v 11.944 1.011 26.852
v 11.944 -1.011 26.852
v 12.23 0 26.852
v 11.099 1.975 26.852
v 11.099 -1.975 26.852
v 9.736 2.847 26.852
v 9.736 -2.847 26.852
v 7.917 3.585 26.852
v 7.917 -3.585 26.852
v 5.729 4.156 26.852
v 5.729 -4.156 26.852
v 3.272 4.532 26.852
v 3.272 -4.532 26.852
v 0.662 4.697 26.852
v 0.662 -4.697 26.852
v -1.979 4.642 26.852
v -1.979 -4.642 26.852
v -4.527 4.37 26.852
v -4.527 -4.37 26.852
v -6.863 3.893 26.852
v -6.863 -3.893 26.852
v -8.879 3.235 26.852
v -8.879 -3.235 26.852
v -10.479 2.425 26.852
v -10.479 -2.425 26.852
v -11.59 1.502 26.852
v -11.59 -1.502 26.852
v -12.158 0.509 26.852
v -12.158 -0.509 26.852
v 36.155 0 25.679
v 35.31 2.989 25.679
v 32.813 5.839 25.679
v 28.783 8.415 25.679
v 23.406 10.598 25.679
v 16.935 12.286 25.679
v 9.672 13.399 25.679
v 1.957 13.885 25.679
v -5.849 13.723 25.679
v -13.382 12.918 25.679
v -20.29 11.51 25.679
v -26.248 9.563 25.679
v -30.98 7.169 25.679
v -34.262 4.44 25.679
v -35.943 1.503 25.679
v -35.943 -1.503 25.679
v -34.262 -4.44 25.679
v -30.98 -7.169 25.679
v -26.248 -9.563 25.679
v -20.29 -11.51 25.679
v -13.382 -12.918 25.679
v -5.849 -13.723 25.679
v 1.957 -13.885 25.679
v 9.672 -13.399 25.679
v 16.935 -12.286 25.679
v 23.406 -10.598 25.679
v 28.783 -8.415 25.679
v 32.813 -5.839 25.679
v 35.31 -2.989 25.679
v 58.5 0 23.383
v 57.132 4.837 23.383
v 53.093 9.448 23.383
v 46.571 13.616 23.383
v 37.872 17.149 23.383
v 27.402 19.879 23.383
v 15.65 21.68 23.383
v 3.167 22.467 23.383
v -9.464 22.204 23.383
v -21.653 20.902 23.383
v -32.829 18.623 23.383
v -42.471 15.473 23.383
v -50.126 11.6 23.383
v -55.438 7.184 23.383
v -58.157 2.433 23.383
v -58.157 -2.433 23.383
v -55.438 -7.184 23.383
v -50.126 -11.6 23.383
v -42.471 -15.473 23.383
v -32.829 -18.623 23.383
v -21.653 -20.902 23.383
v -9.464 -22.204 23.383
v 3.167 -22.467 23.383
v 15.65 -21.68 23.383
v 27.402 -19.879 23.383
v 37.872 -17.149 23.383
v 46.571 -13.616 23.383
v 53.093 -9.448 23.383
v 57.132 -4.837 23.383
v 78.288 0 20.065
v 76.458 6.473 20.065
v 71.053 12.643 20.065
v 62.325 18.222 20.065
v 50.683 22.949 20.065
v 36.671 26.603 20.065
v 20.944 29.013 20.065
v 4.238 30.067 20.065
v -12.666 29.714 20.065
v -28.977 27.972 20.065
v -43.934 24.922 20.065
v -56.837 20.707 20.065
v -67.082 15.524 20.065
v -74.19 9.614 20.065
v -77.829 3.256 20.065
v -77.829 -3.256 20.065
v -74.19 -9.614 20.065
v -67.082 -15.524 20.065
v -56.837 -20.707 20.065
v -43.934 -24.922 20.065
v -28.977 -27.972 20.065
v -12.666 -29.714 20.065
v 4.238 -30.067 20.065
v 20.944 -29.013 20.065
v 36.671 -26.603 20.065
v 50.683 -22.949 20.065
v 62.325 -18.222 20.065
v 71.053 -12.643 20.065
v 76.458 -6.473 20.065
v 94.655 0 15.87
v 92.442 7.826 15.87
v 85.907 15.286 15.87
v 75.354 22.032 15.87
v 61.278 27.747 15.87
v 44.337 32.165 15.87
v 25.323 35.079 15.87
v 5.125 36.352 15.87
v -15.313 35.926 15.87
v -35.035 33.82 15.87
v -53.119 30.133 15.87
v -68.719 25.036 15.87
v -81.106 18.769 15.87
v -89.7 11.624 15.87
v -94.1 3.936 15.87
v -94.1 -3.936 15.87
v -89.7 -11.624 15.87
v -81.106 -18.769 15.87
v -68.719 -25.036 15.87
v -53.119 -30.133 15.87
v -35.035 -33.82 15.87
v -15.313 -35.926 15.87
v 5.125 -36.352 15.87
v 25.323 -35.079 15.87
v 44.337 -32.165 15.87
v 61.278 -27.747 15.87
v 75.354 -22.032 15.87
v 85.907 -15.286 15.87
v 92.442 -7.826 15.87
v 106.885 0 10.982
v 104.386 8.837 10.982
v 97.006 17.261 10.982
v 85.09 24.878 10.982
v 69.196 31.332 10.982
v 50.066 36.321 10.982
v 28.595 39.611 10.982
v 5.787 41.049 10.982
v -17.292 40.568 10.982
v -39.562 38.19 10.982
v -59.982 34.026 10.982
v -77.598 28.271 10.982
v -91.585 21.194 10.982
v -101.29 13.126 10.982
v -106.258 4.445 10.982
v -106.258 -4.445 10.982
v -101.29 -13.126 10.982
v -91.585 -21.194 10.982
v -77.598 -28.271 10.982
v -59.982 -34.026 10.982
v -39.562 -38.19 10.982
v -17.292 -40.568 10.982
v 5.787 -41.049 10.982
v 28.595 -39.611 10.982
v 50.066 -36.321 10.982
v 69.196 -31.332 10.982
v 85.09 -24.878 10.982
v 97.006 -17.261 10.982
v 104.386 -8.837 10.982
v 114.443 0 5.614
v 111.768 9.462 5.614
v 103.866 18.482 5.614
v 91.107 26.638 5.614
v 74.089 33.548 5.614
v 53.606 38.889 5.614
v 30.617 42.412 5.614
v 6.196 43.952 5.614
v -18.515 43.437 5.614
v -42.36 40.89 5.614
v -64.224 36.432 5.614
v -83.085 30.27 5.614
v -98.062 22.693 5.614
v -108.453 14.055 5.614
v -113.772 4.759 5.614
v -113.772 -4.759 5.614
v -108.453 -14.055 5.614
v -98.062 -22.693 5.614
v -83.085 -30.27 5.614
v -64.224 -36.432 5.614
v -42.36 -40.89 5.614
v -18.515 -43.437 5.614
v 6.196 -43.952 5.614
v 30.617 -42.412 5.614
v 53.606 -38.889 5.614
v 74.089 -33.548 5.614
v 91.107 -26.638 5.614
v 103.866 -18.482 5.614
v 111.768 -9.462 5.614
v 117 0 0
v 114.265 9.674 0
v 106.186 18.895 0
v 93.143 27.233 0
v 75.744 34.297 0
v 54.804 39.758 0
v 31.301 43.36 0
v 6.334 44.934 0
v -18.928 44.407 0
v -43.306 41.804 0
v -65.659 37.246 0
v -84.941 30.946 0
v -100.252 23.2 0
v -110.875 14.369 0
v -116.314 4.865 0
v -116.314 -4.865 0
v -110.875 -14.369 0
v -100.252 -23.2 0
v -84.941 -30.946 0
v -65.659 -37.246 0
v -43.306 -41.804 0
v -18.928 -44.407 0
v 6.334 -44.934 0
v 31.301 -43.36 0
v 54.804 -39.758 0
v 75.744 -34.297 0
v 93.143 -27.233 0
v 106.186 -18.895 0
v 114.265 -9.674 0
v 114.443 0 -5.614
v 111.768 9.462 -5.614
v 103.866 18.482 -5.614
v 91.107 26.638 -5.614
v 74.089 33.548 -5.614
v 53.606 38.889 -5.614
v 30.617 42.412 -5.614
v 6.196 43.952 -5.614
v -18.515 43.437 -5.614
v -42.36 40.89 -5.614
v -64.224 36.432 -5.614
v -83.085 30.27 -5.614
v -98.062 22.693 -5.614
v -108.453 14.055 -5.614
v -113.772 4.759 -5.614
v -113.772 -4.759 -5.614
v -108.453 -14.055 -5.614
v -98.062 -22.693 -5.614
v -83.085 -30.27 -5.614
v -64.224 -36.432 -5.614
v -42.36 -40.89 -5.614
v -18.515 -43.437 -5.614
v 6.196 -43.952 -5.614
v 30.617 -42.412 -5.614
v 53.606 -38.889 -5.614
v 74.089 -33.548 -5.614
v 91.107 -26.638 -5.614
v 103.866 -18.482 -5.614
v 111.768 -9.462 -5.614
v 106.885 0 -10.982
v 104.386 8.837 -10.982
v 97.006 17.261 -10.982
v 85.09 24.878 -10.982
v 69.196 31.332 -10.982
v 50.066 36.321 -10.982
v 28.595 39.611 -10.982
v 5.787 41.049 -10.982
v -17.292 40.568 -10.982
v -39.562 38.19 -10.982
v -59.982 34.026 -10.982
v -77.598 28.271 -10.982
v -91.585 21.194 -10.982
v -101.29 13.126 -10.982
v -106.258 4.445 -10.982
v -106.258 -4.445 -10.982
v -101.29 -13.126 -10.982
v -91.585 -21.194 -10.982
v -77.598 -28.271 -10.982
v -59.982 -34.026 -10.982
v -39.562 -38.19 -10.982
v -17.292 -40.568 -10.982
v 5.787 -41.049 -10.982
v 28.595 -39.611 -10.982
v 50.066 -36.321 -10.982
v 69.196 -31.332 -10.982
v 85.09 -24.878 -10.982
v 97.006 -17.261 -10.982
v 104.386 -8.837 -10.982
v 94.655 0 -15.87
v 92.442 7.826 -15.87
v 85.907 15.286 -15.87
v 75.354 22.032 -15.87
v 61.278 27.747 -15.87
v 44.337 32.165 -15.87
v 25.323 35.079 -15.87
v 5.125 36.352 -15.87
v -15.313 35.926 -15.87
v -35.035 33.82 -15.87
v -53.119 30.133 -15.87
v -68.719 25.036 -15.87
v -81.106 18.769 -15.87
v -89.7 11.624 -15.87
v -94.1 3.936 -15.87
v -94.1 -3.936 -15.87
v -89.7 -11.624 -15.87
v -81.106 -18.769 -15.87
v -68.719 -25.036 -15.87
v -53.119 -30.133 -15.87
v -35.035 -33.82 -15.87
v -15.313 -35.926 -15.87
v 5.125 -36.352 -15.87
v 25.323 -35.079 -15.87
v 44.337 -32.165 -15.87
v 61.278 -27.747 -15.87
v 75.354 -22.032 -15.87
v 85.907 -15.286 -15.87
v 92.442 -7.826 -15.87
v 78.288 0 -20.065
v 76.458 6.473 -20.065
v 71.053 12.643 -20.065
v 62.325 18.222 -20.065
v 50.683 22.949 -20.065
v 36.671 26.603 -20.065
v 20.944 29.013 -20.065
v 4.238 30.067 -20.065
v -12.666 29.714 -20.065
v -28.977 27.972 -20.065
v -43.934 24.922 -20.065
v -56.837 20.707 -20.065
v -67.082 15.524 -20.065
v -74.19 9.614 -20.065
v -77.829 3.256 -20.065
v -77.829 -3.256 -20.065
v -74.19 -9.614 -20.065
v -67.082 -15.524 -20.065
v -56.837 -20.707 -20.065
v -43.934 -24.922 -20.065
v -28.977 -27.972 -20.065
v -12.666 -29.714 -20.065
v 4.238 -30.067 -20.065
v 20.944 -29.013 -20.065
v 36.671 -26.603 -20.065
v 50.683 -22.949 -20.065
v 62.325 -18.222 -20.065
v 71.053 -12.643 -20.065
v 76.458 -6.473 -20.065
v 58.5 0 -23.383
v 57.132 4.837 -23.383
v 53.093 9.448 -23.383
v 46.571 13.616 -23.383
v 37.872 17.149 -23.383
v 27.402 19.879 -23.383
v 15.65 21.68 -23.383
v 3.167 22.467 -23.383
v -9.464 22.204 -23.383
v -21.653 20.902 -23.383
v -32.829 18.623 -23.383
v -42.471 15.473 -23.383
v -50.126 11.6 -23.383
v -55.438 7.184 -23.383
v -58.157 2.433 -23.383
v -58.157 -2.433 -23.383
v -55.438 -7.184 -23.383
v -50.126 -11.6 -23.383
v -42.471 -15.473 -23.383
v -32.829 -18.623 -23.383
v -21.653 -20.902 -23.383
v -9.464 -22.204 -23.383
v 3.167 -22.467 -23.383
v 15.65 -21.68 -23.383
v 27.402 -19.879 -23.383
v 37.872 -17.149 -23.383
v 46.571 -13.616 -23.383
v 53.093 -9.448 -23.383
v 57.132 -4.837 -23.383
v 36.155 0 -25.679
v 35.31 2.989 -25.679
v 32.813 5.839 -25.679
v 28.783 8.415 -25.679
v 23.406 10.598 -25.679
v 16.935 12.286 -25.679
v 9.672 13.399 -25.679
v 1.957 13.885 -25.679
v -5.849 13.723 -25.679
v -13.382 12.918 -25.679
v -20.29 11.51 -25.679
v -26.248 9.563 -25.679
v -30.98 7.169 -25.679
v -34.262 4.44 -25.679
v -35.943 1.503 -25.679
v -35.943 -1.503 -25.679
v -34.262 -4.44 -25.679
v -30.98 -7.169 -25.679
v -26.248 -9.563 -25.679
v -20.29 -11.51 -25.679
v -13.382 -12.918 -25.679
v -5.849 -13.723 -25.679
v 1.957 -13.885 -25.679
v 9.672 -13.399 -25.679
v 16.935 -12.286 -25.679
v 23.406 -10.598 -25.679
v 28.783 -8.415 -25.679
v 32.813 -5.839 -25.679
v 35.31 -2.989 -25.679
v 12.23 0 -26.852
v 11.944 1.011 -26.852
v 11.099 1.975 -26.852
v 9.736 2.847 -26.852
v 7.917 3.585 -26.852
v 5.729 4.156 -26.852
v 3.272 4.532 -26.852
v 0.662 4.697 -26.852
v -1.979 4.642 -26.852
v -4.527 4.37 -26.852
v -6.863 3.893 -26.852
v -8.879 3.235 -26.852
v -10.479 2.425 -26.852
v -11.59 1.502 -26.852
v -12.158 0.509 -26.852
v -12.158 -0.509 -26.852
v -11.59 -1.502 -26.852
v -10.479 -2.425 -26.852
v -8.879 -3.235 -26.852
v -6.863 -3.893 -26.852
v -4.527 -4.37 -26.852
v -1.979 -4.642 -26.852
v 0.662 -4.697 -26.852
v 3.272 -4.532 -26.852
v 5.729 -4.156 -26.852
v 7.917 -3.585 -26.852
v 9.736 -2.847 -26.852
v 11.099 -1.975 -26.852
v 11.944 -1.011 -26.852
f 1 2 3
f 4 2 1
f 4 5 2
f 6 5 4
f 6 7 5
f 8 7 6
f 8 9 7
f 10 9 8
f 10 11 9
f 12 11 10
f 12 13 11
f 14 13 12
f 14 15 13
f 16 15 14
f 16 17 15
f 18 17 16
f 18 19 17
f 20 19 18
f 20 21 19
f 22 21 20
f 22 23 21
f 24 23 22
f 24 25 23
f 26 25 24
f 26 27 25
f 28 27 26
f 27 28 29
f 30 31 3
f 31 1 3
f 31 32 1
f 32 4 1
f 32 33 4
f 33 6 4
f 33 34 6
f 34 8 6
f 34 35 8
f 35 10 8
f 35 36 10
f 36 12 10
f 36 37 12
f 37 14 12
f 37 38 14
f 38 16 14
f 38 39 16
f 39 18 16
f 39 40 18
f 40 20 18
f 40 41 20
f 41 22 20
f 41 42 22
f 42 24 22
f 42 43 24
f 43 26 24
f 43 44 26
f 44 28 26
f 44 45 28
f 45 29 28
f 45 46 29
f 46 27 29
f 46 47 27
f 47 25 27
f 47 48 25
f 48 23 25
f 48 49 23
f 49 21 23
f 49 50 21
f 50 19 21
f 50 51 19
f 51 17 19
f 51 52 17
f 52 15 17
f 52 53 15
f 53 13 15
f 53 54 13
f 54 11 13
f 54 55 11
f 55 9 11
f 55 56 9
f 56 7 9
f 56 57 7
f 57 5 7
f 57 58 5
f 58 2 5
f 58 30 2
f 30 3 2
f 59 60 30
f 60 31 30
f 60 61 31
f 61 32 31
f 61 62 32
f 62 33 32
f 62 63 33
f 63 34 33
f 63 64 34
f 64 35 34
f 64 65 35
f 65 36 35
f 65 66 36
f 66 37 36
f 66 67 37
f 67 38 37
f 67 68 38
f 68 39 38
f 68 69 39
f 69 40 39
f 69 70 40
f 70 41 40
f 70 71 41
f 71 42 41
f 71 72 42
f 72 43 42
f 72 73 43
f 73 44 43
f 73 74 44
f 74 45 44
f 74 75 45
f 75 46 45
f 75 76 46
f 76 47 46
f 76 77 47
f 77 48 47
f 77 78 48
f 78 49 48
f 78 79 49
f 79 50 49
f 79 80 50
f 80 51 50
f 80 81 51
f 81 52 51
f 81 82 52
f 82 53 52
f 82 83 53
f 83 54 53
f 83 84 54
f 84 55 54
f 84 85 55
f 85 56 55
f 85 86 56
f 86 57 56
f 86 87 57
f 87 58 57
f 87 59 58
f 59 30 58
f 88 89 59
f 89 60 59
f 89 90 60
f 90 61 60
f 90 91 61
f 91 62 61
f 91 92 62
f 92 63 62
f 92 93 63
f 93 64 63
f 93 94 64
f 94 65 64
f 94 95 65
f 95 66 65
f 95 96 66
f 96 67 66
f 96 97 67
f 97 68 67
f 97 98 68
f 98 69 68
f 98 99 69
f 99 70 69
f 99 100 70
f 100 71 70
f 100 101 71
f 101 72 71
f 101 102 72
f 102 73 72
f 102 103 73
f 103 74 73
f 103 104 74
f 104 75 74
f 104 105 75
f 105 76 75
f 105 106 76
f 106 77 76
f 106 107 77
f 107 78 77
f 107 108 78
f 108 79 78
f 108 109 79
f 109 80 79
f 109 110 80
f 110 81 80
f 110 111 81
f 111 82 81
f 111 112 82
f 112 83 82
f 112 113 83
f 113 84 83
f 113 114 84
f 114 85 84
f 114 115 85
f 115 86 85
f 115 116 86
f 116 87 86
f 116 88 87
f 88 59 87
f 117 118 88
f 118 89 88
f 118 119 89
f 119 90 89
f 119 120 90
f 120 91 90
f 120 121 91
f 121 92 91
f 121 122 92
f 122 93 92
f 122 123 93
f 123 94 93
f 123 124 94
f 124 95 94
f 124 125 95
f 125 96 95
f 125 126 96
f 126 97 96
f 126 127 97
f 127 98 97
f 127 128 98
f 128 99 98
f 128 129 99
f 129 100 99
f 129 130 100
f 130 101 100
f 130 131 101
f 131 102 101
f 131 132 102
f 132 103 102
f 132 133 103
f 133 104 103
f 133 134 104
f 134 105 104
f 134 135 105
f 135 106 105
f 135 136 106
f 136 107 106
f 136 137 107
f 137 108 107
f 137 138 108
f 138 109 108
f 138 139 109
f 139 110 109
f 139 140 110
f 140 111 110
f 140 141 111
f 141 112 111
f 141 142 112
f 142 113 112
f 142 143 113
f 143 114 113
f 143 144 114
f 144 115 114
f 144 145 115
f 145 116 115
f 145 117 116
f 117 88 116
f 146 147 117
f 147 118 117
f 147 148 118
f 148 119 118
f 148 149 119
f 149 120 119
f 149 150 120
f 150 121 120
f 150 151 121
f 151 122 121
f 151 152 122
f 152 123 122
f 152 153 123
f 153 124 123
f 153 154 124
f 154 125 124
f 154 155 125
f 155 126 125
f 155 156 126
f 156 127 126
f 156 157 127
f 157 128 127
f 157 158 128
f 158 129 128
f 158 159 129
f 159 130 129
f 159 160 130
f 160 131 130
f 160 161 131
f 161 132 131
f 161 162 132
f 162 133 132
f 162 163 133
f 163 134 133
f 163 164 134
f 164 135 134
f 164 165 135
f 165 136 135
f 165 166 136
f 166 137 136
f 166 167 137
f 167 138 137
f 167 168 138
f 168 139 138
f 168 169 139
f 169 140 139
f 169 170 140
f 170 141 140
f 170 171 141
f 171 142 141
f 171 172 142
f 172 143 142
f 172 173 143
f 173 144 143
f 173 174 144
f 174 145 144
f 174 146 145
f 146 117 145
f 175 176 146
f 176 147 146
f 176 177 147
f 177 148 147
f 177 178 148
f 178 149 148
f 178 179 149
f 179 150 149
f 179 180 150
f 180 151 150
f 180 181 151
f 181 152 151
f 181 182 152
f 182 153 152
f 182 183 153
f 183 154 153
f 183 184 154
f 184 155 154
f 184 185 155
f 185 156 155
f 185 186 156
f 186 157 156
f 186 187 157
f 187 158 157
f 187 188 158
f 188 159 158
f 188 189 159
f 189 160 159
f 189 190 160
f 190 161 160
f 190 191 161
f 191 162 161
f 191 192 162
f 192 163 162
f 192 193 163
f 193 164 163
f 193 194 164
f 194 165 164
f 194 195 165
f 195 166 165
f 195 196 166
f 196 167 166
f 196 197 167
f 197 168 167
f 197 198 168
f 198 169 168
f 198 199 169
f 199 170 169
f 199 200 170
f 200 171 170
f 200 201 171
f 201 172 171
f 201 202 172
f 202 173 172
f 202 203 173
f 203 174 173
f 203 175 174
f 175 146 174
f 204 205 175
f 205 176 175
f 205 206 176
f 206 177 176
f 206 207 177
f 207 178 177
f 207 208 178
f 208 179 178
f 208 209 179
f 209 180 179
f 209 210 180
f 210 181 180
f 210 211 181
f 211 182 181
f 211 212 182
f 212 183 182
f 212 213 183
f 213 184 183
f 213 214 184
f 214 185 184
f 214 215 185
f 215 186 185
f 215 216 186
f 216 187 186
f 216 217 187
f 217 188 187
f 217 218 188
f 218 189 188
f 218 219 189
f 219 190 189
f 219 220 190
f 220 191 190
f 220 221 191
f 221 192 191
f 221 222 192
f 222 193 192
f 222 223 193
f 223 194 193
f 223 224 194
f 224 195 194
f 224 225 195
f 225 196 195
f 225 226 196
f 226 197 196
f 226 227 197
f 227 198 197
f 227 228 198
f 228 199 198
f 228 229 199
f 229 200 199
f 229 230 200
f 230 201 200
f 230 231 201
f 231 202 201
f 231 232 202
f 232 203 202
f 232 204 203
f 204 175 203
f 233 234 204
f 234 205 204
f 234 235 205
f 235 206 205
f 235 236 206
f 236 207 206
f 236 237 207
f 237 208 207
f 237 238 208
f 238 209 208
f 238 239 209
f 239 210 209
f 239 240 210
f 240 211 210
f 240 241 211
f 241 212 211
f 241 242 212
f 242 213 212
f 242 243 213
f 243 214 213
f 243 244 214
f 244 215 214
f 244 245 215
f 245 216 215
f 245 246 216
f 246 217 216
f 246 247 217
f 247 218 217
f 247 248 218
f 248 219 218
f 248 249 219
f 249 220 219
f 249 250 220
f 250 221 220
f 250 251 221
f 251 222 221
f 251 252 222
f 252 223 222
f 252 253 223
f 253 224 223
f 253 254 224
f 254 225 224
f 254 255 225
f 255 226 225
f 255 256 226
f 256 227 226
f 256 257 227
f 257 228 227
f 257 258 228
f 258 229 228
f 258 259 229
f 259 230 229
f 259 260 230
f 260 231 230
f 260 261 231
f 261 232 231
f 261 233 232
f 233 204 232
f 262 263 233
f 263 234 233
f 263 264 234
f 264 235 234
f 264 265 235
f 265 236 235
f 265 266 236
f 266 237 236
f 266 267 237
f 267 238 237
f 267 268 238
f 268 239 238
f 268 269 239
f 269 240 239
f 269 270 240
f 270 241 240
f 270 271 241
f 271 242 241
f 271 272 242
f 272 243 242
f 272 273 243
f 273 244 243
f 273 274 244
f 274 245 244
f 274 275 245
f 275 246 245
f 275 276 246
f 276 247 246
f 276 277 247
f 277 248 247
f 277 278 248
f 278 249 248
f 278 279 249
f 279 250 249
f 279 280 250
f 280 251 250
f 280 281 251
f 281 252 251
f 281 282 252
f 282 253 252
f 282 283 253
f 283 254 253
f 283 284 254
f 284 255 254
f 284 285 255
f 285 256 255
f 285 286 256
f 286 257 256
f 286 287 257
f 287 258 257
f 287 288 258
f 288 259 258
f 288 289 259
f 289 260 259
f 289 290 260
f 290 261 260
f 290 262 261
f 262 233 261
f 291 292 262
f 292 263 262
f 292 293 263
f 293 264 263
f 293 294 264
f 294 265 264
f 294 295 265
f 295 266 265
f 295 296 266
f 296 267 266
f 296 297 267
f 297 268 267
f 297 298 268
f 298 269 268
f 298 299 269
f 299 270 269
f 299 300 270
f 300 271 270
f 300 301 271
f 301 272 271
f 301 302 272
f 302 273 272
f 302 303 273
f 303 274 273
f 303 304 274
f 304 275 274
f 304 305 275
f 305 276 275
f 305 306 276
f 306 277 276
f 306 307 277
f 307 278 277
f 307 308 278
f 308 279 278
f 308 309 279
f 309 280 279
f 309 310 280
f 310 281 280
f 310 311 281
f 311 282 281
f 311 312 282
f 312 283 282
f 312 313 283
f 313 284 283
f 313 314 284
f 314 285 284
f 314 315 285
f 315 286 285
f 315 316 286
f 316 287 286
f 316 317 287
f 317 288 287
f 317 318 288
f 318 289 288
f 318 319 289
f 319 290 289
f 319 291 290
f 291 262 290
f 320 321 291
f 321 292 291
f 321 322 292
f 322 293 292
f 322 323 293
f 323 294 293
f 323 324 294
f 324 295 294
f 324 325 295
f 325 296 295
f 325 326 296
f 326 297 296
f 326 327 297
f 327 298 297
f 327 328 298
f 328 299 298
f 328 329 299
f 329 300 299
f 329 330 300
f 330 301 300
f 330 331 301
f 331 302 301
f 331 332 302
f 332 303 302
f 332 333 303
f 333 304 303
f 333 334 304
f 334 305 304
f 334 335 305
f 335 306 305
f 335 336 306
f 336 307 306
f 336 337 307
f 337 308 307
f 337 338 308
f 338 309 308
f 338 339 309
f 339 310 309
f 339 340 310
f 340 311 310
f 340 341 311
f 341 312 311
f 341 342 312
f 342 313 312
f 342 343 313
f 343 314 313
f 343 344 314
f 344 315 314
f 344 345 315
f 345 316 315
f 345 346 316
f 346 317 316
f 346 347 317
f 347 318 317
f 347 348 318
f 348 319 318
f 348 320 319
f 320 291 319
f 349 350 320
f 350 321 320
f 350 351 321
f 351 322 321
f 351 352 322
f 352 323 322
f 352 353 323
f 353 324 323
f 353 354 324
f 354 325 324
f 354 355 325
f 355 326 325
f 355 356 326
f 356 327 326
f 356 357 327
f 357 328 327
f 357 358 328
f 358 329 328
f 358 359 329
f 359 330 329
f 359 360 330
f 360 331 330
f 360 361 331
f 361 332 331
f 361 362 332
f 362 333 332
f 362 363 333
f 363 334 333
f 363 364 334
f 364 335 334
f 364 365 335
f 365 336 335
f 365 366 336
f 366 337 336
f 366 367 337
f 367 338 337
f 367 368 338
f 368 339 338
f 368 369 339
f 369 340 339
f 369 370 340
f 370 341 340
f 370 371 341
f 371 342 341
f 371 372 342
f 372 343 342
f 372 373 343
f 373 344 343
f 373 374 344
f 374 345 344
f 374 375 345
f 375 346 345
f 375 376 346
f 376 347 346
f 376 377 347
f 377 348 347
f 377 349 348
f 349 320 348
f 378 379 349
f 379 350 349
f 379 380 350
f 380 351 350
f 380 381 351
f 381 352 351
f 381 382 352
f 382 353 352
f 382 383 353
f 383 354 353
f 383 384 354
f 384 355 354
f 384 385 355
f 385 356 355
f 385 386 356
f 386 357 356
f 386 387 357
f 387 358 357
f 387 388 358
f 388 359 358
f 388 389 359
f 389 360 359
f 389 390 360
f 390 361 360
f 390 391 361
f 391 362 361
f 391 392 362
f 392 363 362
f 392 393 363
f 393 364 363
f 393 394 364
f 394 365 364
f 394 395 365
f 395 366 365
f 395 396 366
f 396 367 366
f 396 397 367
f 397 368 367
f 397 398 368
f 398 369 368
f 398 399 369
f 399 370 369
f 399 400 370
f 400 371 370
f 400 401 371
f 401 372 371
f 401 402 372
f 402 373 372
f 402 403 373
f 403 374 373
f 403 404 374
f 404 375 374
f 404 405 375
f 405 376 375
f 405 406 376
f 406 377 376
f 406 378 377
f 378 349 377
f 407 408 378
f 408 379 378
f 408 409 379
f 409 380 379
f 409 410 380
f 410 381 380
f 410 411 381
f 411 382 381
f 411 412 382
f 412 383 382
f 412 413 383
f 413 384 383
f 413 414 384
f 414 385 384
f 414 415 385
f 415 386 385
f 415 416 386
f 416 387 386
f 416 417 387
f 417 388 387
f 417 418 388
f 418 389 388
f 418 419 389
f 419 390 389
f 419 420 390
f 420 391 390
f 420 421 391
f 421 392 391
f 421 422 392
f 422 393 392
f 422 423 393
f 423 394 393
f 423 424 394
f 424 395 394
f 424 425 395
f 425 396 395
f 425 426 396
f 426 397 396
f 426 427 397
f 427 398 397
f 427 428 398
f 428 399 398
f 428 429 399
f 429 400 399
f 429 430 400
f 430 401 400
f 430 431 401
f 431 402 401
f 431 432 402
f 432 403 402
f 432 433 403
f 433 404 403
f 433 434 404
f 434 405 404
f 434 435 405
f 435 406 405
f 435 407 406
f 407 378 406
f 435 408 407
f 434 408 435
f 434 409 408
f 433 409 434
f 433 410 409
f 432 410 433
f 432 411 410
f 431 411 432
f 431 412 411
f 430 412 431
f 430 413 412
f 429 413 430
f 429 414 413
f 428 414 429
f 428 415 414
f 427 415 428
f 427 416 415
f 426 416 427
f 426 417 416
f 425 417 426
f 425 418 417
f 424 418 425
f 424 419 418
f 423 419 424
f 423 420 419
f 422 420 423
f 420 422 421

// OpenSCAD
// Generated by SolidPython 1.0.1 on 2020-07-29 00:46:50


scale(v = [13, 5, 3]) {
	sphere(r = 9);
}
/***********************************************
*********      SolidPython code:      **********
************************************************
 
# import packages: SolidPython
from solid import *
from solid.utils import *
from itertools import chain, combinations, permutations


class Resize:

    def __init__(self, scad_file):
        self.scad_file = scad_file
        #self.scad_file = import_scad(scad_file)
        # cone/cylinder param:
        self.r1 = 0
        self.r2 = 0
        self.h = 0
        # rectangular prism param:
        self.w = 0
        self.l = 0
        # ellipse param:
        self.r = 0

    # import OpenScad code (file name corresponds to shape)


    # classify shape + parameters
    def assign(self, param1, param2, param3):
        if self.scad_file == 'cone.scad':
            self.r1 = param1
            self.r2 = param2
            self.h = param3
        elif self.scad_file == 'cylinder.scad':
            self.r1 = param1
            self.r2 = param2
            self.h = param3
        elif self.scad_file == 'rectangularPrism.scad':
            self.h = param1
            self.l = param2
            self.w = param3
        else:
            self.r = param1
            self.h = param2

    # resize parameters
    def iterate(self):
        x = range(3, 20, 2)
        i = 1
        if self.scad_file == 'cone.scad':
            tempList = list(permutations(x, 2))
            for temp in tempList:
                param1 = temp[0]
                param2 = temp[1]
                filepath = 'produced_scad_files/' + 'cone' + str(param1) + '_' + str(param2) + '_' + '.scad'
                scad_render_to_file(cylinder(h=param1, r1=param2, r2=0), filepath)

        elif self.scad_file == 'cylinder.scad':
            tempList = list(permutations(x, 3))
            for temp in tempList:
                param1 = temp[0]
                param2 = temp[1]
                filepath = 'produced_scad_files/' + 'cylinder' + str(param1) + '_' + str(param2) + '_' + '.scad'
                scad_render_to_file(cylinder(h=param1, r1=param2, r2=param2), filepath)

        elif self.scad_file == 'rectangularPrism.scad':
            tempList = list(permutations(x, 3))
            for temp in tempList:
                param1 = temp[0]
                param2 = temp[1]
                param3 = temp[2]
                filepath = 'produced_scad_files/' + 'rectangularPrism' + str(param1) + '_' + str(param2) + '_' + str(
                    param3) + '.scad'
                scad_render_to_file(cube(size=(param1, param2, param3)), filepath)

        elif self.scad_file == 'ellipse.scad':
            tempList = list(permutations(x, 4))
            for temp in tempList:
                param1 = temp[0]
                param2 = temp[1]
                param3 = temp[2]
                param4 = temp[3]
                filepath = 'produced_scad_files/' + 'ellipse' + str(param1) + '_' + str(param2) + '_' + str(param3) + '_' + str(param4) + '.scad'
                scad_render_to_file(scale([param1, param2, param3])(sphere(r=param4)), filepath)

    def render_to_scadfile(self):
        scad_render_to_file(scad, 'example.scad') 
 
************************************************/
